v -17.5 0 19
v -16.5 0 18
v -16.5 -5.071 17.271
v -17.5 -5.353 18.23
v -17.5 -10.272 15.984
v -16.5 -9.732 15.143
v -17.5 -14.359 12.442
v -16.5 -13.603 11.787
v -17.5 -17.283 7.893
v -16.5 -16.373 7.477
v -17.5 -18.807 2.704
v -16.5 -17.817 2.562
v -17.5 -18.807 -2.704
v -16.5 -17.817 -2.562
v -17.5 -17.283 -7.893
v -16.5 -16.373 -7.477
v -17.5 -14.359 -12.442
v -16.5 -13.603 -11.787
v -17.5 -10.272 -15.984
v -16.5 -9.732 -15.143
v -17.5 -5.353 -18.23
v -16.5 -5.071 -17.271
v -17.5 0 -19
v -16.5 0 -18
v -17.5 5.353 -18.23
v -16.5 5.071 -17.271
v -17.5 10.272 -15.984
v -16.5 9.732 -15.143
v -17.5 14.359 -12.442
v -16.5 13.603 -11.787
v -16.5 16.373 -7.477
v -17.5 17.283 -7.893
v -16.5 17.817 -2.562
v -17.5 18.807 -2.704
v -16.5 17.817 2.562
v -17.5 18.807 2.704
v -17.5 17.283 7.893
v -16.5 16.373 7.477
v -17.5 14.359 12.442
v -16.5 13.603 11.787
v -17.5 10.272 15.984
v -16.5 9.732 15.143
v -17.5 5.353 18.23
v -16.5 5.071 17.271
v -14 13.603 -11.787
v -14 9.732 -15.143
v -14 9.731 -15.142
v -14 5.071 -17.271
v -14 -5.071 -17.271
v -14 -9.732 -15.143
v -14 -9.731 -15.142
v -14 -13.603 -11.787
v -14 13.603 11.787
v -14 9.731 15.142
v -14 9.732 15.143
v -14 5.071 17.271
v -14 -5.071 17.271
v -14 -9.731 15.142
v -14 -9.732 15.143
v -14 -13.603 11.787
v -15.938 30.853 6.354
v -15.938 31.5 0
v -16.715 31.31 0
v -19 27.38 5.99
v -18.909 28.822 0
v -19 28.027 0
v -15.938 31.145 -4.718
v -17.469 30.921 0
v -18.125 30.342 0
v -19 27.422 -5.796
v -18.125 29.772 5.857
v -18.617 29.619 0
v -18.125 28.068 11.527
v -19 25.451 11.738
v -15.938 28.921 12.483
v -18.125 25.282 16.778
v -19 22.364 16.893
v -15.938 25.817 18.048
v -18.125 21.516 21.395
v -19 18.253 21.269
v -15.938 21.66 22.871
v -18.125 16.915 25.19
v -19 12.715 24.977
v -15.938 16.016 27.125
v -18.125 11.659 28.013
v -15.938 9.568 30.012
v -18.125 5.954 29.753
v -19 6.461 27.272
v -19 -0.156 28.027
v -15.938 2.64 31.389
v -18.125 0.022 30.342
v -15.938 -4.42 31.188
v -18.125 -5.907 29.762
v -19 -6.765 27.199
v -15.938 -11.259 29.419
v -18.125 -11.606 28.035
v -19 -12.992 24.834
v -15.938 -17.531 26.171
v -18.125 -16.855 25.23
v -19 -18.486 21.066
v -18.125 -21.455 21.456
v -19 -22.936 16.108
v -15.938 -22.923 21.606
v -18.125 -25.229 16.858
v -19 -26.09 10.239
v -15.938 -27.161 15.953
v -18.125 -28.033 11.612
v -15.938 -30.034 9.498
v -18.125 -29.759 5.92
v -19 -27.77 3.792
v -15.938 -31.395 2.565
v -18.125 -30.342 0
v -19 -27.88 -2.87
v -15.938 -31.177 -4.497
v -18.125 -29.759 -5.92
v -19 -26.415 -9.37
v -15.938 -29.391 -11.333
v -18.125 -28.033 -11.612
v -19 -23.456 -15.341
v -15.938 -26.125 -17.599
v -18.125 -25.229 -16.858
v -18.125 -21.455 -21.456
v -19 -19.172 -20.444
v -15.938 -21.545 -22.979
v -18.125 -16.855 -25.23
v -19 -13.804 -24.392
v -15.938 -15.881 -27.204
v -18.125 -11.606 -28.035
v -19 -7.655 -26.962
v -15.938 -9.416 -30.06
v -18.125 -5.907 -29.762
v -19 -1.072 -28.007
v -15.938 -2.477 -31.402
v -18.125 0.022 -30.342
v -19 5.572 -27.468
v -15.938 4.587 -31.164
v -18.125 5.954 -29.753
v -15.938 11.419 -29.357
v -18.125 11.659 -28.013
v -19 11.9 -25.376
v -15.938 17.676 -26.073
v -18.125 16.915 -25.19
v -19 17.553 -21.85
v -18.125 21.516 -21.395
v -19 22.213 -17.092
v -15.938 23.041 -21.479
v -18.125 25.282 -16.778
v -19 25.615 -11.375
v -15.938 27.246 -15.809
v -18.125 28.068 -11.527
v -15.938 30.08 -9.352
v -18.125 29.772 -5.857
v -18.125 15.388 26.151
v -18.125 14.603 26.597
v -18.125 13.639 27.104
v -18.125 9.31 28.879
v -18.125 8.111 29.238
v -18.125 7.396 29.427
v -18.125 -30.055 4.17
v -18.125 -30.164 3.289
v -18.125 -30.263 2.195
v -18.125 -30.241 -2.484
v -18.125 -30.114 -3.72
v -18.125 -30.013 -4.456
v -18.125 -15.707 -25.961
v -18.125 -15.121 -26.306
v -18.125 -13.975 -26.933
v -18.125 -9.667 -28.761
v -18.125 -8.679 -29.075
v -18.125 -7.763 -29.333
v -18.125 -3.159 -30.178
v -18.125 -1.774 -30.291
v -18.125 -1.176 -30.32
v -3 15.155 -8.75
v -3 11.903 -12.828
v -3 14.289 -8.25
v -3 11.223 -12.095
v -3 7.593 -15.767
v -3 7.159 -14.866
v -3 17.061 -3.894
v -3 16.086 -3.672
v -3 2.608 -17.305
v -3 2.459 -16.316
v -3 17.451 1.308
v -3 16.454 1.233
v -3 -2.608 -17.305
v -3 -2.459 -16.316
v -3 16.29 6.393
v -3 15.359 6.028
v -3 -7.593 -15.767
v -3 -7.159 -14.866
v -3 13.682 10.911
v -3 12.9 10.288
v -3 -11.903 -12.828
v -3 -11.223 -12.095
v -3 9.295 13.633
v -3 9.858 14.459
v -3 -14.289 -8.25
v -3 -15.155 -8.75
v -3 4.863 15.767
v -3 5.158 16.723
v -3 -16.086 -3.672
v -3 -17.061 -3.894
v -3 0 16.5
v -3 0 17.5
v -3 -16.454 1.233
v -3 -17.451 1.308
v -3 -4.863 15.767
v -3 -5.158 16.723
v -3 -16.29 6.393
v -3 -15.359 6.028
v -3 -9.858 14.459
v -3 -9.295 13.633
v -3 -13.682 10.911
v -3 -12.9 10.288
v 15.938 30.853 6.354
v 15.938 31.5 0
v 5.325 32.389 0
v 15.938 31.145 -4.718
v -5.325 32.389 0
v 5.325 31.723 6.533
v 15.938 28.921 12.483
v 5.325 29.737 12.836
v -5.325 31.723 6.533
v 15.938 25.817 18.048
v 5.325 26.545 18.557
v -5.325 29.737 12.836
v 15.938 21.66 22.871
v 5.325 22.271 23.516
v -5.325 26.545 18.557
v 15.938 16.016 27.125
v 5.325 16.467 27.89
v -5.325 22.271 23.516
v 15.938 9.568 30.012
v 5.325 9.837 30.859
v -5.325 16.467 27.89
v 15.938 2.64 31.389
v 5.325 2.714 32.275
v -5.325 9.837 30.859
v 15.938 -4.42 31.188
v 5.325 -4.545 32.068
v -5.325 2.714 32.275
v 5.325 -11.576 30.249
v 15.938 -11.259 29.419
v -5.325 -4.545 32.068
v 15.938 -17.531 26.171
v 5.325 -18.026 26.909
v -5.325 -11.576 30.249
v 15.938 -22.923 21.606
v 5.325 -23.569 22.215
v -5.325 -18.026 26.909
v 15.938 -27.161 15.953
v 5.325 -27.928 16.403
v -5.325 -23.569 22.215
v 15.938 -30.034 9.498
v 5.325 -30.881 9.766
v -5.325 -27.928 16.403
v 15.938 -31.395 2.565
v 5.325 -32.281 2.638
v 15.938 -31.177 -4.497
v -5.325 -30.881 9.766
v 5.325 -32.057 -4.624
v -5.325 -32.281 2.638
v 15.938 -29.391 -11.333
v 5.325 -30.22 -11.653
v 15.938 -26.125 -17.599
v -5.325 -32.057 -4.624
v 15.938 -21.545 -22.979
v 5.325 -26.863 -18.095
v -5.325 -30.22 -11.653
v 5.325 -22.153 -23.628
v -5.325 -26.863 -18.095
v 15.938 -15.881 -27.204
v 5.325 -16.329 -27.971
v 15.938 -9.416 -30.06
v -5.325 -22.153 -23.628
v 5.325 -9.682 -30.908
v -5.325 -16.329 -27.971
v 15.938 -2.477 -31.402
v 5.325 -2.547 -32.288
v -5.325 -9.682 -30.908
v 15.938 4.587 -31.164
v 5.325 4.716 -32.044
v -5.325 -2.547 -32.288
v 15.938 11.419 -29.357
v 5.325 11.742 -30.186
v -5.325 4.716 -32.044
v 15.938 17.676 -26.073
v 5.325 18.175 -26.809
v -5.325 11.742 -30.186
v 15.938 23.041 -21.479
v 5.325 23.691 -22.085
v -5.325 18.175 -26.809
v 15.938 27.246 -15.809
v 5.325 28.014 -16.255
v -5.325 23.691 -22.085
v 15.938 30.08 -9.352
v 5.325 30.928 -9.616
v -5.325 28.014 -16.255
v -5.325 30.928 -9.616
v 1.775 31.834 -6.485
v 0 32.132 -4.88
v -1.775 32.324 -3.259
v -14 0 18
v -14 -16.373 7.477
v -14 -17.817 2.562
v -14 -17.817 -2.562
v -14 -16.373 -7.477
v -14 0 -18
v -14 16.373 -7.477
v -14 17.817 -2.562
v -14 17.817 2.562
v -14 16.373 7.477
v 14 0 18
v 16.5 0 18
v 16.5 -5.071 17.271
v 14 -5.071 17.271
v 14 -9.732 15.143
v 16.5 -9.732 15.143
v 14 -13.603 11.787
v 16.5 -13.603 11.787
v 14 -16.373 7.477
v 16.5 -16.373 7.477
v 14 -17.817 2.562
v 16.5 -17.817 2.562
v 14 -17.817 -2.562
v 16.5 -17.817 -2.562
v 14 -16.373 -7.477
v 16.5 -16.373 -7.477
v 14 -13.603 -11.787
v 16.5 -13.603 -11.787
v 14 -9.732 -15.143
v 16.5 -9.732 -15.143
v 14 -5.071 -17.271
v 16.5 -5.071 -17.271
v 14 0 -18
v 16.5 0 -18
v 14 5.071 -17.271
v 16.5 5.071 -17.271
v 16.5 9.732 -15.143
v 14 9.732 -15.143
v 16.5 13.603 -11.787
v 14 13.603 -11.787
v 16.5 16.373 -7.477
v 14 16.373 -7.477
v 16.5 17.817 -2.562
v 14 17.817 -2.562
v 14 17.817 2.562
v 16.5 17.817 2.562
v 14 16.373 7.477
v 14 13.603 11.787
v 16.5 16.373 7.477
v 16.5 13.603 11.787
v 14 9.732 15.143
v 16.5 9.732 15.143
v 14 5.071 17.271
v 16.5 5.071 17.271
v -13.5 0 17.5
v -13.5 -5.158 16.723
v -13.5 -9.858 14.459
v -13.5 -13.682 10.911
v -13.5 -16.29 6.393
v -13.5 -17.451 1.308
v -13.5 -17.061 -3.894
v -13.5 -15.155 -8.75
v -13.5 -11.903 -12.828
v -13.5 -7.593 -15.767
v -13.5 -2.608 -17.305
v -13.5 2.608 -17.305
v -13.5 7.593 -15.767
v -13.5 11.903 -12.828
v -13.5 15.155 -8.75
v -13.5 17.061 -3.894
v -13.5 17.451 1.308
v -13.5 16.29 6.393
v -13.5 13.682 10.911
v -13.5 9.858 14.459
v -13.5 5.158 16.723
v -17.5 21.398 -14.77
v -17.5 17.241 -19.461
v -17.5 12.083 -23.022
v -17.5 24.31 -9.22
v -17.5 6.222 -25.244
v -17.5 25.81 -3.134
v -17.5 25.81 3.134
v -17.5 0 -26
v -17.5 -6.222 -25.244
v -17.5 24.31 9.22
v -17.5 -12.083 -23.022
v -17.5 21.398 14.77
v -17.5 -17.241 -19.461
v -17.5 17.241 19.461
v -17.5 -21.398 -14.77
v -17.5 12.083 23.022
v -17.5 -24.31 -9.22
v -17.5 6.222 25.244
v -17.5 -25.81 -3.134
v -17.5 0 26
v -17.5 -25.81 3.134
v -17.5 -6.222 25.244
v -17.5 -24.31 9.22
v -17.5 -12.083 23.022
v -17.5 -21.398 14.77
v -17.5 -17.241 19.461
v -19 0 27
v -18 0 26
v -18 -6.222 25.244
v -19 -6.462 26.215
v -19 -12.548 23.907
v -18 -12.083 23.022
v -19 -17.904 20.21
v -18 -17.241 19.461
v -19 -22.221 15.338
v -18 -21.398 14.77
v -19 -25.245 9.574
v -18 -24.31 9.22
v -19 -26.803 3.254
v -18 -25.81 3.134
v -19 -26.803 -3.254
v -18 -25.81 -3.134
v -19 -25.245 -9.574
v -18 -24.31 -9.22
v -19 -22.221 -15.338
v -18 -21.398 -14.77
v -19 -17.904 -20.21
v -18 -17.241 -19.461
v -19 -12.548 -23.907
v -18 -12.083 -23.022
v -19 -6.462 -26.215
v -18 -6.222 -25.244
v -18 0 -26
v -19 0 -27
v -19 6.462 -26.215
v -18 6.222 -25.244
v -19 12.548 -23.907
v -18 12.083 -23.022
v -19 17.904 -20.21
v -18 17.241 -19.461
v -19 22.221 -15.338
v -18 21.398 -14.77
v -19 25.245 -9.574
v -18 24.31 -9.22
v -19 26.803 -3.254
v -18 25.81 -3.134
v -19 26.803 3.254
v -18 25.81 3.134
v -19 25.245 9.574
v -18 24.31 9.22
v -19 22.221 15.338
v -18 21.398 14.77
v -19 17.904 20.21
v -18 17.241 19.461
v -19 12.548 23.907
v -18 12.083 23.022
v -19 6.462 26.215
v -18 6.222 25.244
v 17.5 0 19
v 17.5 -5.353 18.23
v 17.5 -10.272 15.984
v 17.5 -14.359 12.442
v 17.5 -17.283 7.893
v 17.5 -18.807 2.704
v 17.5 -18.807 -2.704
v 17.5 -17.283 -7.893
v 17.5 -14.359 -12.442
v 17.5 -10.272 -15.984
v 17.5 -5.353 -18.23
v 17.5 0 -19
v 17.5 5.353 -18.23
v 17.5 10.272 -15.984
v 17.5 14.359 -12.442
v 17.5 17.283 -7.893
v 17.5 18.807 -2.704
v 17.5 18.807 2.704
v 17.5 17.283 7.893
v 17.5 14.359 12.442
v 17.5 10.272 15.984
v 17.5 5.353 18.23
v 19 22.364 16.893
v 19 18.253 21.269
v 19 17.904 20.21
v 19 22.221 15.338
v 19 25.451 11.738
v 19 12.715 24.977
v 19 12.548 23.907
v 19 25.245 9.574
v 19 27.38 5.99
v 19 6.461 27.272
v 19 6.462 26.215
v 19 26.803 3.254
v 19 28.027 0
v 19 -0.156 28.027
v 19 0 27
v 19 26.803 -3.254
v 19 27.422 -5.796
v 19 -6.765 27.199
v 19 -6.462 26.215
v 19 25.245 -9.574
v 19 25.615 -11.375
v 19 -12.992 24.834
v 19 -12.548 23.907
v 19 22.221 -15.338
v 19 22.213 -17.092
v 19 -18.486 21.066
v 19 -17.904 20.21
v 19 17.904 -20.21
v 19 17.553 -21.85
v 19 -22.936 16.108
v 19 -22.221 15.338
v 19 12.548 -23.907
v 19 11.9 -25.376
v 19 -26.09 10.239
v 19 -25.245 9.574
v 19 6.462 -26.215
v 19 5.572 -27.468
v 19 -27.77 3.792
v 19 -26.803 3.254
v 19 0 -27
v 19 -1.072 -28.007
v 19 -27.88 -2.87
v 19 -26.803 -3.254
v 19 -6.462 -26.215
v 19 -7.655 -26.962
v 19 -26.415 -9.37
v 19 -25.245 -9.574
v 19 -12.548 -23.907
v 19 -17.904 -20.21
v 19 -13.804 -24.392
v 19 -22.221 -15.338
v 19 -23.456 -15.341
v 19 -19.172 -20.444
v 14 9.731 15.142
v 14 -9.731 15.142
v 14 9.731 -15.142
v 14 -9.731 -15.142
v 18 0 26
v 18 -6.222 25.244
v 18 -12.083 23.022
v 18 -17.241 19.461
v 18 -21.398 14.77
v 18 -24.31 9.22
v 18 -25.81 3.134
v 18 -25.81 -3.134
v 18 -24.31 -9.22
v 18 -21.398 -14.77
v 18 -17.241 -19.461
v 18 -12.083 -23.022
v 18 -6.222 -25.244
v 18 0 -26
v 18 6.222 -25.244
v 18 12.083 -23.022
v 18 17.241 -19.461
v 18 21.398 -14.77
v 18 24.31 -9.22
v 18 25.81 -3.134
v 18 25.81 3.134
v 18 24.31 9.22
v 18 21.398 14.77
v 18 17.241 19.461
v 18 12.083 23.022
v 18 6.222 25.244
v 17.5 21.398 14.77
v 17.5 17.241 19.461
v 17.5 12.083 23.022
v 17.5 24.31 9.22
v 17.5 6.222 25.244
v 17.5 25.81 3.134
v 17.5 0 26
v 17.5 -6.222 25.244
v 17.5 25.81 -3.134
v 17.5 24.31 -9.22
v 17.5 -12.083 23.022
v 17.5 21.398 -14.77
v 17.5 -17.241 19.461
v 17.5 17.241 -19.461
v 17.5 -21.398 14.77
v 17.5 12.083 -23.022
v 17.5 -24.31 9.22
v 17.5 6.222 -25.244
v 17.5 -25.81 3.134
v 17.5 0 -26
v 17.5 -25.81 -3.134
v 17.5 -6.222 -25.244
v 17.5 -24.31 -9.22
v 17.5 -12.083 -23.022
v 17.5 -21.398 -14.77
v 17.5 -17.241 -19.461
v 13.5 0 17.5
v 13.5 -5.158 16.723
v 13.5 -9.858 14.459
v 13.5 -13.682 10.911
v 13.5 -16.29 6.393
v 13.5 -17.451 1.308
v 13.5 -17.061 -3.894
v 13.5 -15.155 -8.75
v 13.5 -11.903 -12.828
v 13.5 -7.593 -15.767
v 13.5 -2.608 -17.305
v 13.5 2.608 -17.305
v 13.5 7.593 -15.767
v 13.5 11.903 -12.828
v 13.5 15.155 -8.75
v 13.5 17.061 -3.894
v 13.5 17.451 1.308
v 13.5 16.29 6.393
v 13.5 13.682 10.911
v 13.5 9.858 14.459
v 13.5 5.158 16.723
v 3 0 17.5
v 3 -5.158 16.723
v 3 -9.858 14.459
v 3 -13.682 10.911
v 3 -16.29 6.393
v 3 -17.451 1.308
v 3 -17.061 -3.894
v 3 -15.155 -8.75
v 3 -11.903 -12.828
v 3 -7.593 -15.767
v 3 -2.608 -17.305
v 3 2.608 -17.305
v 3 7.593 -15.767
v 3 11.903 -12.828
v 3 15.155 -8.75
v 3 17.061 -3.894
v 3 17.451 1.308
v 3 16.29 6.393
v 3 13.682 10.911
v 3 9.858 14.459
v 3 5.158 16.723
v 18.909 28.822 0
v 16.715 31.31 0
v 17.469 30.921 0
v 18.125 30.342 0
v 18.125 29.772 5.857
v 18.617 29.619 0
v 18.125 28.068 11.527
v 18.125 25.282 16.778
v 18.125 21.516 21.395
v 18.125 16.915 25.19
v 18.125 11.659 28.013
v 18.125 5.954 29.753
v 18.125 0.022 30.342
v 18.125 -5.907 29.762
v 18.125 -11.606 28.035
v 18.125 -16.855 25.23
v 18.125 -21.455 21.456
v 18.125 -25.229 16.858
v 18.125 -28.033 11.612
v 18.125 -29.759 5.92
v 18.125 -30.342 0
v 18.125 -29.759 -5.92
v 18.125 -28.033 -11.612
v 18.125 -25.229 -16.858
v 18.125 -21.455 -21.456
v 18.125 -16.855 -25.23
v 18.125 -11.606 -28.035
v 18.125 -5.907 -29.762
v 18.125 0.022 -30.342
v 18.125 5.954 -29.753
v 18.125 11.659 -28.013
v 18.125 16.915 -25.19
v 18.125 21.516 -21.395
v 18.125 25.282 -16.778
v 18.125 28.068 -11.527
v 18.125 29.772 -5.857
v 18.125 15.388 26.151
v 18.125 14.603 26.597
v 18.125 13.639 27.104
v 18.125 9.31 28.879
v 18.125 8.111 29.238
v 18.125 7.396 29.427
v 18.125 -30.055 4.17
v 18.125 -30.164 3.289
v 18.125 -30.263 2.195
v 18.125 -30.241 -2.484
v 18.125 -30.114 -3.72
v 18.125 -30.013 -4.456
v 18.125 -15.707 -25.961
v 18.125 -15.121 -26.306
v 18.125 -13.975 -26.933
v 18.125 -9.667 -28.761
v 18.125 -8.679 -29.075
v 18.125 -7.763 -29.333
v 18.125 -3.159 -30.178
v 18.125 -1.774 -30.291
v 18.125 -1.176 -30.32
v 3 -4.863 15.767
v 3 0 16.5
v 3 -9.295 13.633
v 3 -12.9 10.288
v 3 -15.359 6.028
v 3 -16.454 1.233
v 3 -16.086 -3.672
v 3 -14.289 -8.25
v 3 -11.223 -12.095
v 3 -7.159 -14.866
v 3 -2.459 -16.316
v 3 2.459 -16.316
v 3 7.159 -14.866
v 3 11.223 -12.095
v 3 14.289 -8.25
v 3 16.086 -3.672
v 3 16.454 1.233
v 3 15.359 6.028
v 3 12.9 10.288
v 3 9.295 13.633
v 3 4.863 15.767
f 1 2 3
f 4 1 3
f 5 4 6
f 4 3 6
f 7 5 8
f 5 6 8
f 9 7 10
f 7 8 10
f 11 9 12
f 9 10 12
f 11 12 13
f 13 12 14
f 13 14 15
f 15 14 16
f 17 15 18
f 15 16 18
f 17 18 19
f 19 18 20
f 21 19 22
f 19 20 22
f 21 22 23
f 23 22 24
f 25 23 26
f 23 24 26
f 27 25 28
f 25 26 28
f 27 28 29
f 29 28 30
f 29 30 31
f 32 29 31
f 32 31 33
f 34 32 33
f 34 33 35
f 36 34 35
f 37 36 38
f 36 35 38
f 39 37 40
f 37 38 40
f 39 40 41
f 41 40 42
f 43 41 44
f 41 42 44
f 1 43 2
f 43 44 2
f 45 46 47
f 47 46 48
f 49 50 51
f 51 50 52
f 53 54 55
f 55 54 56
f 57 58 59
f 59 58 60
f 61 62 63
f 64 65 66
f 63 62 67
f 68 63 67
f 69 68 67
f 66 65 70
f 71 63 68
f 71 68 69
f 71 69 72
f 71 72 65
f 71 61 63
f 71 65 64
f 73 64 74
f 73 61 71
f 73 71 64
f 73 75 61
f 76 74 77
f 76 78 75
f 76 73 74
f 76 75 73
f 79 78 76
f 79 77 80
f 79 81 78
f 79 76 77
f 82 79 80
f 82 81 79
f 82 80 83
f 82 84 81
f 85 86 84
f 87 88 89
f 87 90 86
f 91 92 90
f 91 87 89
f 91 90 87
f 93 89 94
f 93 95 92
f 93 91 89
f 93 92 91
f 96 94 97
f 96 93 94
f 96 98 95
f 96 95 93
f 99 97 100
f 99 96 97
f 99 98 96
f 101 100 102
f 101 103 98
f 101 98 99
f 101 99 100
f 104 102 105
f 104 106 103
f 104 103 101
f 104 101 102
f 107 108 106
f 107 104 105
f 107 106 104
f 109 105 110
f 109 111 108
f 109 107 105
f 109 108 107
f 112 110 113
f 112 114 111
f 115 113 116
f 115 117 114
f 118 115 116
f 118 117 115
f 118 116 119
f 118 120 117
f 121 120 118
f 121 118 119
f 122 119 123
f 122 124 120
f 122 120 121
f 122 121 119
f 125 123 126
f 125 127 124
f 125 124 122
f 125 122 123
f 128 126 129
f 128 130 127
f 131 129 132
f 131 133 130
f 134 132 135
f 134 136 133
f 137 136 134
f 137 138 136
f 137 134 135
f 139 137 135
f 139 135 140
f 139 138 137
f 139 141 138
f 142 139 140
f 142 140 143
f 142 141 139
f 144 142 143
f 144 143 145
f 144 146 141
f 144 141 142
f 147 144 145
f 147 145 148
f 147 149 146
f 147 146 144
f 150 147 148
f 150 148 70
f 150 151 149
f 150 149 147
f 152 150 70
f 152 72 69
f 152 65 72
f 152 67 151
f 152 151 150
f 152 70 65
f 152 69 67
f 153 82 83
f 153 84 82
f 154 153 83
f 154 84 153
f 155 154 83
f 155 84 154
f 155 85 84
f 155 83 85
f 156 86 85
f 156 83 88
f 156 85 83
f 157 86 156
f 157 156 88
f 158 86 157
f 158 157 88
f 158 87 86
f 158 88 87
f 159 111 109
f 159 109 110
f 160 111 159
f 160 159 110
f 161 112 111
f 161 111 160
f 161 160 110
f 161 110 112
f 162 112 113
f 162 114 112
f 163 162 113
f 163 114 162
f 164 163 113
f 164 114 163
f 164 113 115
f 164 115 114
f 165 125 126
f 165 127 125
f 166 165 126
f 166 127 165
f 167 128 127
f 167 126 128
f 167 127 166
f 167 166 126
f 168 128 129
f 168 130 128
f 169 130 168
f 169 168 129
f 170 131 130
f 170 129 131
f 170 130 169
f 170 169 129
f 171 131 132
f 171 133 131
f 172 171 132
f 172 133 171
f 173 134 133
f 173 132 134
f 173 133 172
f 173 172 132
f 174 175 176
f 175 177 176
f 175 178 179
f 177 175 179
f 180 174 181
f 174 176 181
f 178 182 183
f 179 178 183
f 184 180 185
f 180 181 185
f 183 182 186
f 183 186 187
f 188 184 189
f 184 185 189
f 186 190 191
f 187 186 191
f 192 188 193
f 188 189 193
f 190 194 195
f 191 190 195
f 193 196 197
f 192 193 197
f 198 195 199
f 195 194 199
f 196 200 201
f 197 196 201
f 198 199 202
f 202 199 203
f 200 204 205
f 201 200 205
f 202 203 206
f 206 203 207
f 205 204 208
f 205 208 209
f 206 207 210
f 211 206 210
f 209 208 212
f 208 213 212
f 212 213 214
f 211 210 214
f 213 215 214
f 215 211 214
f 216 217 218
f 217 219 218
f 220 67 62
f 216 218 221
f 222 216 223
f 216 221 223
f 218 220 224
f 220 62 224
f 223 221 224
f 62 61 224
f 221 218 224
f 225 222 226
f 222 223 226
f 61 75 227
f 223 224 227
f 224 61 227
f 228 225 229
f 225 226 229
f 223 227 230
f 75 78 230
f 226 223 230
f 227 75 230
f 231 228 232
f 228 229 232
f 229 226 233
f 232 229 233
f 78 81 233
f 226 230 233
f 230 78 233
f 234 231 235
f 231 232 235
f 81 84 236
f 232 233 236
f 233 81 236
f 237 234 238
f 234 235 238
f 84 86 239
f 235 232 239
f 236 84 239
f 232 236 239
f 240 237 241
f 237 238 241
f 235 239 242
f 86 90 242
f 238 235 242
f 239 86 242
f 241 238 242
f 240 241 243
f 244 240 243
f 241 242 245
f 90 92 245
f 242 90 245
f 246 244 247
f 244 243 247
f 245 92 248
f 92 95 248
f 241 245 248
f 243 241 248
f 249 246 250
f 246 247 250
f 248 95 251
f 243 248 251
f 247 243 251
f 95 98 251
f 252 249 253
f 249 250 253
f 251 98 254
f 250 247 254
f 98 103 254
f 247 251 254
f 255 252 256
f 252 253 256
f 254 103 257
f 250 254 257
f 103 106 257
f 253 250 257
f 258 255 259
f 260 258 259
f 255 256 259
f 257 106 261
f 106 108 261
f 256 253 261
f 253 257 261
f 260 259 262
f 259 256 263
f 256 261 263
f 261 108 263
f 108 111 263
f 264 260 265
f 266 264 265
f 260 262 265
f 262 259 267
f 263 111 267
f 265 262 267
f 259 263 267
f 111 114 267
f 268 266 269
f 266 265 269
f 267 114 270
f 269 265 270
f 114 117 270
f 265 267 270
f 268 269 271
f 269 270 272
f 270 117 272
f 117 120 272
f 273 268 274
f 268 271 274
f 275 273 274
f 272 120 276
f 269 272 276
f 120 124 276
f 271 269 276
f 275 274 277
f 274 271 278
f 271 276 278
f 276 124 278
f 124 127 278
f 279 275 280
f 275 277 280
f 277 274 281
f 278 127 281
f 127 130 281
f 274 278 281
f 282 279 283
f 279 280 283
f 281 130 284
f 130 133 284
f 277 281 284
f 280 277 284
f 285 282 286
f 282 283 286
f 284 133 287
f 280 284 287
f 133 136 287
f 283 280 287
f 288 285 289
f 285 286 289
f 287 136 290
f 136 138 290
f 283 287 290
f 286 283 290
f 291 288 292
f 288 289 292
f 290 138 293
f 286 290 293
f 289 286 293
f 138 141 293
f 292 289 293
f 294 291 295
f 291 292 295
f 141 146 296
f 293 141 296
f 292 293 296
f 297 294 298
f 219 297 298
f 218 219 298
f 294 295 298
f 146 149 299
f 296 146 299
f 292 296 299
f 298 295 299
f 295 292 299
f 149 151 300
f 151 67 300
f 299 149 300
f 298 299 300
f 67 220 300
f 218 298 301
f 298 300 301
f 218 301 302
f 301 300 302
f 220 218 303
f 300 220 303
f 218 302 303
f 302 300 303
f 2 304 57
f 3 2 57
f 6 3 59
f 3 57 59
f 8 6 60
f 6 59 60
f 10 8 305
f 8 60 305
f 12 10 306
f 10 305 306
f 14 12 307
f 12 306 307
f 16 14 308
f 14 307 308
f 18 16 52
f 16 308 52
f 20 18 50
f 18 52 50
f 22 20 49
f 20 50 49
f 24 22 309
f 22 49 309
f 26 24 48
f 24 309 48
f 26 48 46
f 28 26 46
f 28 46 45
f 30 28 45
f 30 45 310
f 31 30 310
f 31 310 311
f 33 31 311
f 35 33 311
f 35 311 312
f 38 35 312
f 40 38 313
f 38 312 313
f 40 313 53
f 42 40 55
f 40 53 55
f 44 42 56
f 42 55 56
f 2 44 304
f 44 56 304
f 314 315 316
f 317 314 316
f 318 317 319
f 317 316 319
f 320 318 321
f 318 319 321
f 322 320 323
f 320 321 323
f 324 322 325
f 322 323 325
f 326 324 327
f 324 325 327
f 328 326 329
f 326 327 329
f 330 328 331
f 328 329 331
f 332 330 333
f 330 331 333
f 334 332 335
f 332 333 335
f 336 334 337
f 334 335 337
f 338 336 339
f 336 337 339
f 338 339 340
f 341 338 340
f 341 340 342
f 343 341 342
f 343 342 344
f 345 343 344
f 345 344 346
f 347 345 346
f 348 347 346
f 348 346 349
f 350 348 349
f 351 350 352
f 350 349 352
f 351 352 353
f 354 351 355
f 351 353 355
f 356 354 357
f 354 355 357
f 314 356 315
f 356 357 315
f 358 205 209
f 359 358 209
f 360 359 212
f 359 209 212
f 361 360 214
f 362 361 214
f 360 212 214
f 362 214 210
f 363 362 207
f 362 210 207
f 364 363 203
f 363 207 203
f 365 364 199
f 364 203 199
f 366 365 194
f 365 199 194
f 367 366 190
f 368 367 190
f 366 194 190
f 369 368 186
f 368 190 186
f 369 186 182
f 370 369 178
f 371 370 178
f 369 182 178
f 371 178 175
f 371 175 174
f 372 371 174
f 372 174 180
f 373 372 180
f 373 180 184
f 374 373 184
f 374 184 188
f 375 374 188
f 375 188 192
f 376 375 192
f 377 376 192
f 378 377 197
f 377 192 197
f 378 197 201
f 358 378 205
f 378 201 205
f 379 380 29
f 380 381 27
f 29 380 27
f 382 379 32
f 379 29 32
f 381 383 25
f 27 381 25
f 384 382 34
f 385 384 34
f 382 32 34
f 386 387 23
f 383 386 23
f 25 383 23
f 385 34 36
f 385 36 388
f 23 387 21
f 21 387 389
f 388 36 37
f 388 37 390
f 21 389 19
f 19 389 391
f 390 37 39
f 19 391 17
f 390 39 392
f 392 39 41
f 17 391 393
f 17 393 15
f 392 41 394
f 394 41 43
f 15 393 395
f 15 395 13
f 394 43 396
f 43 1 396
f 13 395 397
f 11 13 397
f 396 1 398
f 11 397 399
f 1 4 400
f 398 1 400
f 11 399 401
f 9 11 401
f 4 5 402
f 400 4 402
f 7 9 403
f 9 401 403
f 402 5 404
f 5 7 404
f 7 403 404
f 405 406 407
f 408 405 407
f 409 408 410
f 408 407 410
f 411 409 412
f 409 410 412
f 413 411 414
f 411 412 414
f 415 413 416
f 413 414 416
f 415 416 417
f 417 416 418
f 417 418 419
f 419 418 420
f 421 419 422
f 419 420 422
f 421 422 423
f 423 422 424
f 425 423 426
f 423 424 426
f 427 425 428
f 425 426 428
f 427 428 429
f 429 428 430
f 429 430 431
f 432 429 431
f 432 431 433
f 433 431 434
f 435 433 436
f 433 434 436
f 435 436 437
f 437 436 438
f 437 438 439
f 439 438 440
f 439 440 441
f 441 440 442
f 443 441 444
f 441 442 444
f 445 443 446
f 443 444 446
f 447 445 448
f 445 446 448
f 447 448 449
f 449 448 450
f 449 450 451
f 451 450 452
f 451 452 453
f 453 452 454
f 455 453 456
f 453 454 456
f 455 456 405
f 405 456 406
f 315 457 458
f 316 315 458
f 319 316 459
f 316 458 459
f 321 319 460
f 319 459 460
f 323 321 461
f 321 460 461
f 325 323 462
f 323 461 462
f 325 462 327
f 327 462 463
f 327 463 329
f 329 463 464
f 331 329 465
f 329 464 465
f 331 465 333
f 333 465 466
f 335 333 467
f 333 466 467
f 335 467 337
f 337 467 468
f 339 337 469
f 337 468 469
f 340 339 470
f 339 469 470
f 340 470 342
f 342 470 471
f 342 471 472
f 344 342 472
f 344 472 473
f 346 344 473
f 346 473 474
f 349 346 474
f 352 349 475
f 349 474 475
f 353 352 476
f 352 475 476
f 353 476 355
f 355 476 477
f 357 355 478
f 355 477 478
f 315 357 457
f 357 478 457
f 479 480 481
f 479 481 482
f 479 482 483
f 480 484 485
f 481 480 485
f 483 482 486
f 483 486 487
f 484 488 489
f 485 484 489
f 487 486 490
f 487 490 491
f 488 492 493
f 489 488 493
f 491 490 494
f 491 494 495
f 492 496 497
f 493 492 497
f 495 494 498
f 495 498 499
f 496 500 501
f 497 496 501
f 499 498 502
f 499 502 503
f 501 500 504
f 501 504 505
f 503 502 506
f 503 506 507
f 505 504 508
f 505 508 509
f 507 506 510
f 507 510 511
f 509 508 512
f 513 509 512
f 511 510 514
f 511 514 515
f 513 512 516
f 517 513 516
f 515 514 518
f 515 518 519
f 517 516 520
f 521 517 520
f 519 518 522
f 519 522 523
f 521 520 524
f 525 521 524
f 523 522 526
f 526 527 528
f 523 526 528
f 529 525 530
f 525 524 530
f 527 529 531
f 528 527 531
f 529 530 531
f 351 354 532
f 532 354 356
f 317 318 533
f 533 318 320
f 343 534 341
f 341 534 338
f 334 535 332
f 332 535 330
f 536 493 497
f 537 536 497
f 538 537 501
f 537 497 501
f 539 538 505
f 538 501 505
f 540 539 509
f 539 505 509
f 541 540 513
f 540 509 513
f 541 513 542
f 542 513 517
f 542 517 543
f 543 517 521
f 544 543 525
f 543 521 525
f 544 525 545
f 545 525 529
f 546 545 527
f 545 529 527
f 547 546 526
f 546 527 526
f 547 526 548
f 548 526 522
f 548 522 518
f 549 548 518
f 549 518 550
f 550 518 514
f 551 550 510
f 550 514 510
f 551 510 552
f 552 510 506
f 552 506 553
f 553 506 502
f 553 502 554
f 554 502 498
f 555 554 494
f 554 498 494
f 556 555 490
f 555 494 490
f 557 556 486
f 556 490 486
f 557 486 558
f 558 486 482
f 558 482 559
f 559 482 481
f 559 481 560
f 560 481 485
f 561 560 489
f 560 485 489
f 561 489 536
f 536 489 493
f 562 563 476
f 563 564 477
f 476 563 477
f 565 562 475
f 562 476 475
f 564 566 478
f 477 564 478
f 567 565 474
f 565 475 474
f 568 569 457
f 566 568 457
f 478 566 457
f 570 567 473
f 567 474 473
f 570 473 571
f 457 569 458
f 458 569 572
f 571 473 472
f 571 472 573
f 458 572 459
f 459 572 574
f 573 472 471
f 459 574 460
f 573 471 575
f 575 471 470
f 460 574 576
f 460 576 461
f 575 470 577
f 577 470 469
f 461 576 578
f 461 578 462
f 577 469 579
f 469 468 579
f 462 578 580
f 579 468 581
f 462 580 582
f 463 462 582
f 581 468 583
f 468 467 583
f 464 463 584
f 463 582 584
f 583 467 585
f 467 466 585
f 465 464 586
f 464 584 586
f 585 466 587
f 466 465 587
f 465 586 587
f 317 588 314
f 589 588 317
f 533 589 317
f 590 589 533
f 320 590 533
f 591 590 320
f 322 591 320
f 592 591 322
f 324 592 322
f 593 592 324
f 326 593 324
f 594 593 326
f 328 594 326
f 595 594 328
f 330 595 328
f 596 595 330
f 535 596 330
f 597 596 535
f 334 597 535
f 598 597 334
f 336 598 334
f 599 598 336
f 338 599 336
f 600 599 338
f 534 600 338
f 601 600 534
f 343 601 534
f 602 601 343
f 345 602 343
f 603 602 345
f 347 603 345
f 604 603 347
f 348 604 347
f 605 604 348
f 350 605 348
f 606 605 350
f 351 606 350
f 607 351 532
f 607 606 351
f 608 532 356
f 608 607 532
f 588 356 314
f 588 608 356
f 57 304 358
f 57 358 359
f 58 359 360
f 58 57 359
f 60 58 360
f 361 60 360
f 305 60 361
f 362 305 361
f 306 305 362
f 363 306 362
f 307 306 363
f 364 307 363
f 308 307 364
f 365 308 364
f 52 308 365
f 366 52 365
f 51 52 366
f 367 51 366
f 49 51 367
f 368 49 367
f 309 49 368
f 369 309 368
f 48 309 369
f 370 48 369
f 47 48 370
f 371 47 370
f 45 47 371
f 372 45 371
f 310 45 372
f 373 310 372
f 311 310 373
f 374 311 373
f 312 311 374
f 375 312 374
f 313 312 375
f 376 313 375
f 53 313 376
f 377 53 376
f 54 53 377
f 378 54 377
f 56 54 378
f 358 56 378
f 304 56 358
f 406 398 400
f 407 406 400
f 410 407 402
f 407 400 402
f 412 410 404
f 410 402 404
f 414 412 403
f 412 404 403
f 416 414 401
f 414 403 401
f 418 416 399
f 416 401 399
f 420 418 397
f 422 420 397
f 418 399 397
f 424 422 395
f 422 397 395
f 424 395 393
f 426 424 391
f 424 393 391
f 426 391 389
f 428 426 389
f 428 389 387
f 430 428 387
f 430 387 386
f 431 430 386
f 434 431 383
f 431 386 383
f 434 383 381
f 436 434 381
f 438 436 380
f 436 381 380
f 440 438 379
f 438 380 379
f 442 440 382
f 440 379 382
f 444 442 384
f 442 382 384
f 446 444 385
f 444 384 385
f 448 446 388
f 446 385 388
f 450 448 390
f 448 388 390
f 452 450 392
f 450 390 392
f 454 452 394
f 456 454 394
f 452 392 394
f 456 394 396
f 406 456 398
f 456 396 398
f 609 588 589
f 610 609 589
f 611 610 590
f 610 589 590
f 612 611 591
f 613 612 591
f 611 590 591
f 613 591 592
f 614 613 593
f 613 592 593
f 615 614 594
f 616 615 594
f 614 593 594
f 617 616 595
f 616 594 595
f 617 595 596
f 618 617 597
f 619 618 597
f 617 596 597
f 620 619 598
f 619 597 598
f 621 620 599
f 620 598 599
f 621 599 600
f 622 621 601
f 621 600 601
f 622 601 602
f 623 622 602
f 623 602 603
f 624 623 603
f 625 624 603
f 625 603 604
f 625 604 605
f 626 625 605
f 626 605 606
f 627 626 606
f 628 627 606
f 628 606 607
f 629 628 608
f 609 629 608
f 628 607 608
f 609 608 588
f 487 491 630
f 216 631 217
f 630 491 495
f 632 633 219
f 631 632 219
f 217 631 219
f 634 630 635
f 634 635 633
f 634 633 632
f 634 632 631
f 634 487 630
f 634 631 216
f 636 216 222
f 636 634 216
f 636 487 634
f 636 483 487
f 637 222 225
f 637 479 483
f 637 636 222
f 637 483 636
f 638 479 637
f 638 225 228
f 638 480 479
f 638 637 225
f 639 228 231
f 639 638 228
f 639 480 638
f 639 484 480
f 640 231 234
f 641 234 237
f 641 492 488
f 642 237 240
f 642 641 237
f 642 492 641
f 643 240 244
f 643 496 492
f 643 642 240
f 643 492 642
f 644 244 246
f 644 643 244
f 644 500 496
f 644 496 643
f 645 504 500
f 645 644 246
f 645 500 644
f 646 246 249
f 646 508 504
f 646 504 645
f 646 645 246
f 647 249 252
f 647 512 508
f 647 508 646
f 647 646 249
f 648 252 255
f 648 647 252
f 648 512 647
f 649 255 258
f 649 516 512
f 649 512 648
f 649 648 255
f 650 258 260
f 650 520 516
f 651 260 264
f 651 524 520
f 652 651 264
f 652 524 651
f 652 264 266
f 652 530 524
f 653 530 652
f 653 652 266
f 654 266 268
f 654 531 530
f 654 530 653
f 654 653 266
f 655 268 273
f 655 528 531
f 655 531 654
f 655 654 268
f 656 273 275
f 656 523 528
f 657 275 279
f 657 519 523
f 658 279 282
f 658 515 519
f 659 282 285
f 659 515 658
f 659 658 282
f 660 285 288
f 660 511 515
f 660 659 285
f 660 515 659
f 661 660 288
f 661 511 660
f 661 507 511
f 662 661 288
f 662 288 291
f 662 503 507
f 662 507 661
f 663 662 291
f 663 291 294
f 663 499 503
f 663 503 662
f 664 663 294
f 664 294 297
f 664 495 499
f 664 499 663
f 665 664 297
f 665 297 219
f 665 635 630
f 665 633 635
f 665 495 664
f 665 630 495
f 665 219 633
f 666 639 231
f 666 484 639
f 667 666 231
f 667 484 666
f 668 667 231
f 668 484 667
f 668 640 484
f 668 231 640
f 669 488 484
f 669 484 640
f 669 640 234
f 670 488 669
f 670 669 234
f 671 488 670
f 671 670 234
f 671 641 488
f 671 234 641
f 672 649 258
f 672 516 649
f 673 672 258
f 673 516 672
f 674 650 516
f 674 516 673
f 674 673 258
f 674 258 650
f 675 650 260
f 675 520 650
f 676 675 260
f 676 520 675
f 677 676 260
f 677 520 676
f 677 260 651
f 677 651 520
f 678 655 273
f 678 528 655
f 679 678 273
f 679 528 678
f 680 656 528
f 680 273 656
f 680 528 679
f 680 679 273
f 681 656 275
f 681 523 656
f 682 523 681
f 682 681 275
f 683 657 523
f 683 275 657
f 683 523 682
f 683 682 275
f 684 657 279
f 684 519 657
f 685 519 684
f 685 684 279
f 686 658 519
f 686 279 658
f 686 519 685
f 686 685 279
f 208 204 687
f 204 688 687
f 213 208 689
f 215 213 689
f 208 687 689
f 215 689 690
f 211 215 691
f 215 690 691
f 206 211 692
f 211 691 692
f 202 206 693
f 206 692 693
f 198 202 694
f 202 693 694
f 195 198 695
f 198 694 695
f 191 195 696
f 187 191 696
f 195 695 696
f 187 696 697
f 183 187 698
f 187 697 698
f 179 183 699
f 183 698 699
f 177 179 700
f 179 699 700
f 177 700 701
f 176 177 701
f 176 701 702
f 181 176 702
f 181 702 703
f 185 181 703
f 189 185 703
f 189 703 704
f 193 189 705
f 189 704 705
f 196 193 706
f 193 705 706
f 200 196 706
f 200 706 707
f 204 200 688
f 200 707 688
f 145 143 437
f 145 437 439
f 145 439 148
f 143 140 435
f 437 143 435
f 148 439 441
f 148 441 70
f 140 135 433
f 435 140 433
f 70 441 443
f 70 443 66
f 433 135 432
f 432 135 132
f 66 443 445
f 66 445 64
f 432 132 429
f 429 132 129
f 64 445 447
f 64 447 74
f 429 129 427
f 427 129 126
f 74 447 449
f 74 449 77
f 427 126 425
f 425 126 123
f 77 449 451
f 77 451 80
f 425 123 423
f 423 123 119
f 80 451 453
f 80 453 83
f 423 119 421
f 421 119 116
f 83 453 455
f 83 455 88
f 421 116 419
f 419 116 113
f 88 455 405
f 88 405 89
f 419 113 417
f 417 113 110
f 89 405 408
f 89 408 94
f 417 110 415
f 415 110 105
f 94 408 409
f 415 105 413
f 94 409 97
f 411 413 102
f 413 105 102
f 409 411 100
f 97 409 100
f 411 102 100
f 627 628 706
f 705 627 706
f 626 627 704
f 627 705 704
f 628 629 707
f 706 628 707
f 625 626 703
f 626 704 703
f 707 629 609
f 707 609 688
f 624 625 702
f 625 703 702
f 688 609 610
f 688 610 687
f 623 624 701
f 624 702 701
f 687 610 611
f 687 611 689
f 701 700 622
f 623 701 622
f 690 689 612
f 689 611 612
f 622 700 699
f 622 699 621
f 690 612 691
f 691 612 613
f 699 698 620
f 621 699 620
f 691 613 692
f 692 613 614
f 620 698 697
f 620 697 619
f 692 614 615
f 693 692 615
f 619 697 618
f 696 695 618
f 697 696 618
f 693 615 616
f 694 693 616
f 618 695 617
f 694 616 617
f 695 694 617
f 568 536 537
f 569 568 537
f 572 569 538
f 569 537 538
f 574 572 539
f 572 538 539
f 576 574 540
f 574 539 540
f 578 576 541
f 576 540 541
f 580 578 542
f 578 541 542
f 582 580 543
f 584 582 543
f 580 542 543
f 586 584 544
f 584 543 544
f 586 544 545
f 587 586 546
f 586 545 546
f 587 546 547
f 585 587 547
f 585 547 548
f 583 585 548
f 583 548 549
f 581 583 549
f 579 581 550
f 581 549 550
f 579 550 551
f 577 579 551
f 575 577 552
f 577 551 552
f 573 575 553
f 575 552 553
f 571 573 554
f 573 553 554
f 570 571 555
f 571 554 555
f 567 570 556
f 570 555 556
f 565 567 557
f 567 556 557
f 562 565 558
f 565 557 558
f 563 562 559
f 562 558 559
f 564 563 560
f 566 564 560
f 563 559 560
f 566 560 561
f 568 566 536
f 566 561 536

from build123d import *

# Parameters (mm, degrees)
CHAMFER1_SIZE = 1
CHAMFER2_SIZE = 0.5
FILLET1_R     = 3.5


with BuildPart() as part:
    # Sketch1 → Revolve1 (revolve)
    with BuildSketch(Plane.XY, mode=Mode.PRIVATE) as revolve1_sk:
        Polygon((-14, 17.5), (-3, 17.5), (-3, 16.5), (3, 16.5), (3, 17.5), (14, 17.5), (14, 18), (17.5, 18), (17.5, 26), (19, 26), (19, 32.5), (-19, 32.5), (-19, 26), (-17.5, 26), (-17.5, 18), (-14, 18), align=None)
    revolve(revolve1_sk.sketch.rotate(Axis((-17.6, 0, 0), (1, 0, 0)), 90), axis=Axis((-17.6, 0, 0), (1, 0, 0)))

    # Sketch2 → Cut-Revolve1 (revolve, cut)
    with BuildSketch(Plane.XY):
        with BuildLine():
            Line((-19, 46.076365747), (19, 46.076365747))
            Line((19, 46.076365747), (19, 31.076365747))
            ThreePointArc((19, 31.076365747), (0, 32.5), (-19, 31.076365747))
            Line((-19, 31.076365747), (-19, 46.076365747))
        make_face()
    revolve(axis=Axis((-17.6, 0, 0), (1, 0, 0)), mode=Mode.SUBTRACT)

    # Chamfer1
    chamfer1_edges = [part.edges().sort_by_distance(p)[0] for p in [
        (-19, 0, -26),
        (19, 0, -26),
        (17.5, 0, -18),
        (-17.5, 0, -18),
    ]]
    chamfer(chamfer1_edges, length=CHAMFER1_SIZE)

    # Chamfer2
    chamfer2_edges = [part.edges().sort_by_distance(p)[0] for p in [
        (14, 0, -17.5),
        (-14, 0, -17.5),
    ]]
    chamfer(chamfer2_edges, length=CHAMFER2_SIZE - 0.0001)  # a hair under: the kernel refuses the full size

    # Fillet1
    fillet1_edges = [part.edges().sort_by_distance(p)[0] for p in [
        (-19, -31.076365747, 0),
        (19, -31.076365747, 0),
    ]]
    fillet(fillet1_edges, radius=FILLET1_R)


solid = part.part
